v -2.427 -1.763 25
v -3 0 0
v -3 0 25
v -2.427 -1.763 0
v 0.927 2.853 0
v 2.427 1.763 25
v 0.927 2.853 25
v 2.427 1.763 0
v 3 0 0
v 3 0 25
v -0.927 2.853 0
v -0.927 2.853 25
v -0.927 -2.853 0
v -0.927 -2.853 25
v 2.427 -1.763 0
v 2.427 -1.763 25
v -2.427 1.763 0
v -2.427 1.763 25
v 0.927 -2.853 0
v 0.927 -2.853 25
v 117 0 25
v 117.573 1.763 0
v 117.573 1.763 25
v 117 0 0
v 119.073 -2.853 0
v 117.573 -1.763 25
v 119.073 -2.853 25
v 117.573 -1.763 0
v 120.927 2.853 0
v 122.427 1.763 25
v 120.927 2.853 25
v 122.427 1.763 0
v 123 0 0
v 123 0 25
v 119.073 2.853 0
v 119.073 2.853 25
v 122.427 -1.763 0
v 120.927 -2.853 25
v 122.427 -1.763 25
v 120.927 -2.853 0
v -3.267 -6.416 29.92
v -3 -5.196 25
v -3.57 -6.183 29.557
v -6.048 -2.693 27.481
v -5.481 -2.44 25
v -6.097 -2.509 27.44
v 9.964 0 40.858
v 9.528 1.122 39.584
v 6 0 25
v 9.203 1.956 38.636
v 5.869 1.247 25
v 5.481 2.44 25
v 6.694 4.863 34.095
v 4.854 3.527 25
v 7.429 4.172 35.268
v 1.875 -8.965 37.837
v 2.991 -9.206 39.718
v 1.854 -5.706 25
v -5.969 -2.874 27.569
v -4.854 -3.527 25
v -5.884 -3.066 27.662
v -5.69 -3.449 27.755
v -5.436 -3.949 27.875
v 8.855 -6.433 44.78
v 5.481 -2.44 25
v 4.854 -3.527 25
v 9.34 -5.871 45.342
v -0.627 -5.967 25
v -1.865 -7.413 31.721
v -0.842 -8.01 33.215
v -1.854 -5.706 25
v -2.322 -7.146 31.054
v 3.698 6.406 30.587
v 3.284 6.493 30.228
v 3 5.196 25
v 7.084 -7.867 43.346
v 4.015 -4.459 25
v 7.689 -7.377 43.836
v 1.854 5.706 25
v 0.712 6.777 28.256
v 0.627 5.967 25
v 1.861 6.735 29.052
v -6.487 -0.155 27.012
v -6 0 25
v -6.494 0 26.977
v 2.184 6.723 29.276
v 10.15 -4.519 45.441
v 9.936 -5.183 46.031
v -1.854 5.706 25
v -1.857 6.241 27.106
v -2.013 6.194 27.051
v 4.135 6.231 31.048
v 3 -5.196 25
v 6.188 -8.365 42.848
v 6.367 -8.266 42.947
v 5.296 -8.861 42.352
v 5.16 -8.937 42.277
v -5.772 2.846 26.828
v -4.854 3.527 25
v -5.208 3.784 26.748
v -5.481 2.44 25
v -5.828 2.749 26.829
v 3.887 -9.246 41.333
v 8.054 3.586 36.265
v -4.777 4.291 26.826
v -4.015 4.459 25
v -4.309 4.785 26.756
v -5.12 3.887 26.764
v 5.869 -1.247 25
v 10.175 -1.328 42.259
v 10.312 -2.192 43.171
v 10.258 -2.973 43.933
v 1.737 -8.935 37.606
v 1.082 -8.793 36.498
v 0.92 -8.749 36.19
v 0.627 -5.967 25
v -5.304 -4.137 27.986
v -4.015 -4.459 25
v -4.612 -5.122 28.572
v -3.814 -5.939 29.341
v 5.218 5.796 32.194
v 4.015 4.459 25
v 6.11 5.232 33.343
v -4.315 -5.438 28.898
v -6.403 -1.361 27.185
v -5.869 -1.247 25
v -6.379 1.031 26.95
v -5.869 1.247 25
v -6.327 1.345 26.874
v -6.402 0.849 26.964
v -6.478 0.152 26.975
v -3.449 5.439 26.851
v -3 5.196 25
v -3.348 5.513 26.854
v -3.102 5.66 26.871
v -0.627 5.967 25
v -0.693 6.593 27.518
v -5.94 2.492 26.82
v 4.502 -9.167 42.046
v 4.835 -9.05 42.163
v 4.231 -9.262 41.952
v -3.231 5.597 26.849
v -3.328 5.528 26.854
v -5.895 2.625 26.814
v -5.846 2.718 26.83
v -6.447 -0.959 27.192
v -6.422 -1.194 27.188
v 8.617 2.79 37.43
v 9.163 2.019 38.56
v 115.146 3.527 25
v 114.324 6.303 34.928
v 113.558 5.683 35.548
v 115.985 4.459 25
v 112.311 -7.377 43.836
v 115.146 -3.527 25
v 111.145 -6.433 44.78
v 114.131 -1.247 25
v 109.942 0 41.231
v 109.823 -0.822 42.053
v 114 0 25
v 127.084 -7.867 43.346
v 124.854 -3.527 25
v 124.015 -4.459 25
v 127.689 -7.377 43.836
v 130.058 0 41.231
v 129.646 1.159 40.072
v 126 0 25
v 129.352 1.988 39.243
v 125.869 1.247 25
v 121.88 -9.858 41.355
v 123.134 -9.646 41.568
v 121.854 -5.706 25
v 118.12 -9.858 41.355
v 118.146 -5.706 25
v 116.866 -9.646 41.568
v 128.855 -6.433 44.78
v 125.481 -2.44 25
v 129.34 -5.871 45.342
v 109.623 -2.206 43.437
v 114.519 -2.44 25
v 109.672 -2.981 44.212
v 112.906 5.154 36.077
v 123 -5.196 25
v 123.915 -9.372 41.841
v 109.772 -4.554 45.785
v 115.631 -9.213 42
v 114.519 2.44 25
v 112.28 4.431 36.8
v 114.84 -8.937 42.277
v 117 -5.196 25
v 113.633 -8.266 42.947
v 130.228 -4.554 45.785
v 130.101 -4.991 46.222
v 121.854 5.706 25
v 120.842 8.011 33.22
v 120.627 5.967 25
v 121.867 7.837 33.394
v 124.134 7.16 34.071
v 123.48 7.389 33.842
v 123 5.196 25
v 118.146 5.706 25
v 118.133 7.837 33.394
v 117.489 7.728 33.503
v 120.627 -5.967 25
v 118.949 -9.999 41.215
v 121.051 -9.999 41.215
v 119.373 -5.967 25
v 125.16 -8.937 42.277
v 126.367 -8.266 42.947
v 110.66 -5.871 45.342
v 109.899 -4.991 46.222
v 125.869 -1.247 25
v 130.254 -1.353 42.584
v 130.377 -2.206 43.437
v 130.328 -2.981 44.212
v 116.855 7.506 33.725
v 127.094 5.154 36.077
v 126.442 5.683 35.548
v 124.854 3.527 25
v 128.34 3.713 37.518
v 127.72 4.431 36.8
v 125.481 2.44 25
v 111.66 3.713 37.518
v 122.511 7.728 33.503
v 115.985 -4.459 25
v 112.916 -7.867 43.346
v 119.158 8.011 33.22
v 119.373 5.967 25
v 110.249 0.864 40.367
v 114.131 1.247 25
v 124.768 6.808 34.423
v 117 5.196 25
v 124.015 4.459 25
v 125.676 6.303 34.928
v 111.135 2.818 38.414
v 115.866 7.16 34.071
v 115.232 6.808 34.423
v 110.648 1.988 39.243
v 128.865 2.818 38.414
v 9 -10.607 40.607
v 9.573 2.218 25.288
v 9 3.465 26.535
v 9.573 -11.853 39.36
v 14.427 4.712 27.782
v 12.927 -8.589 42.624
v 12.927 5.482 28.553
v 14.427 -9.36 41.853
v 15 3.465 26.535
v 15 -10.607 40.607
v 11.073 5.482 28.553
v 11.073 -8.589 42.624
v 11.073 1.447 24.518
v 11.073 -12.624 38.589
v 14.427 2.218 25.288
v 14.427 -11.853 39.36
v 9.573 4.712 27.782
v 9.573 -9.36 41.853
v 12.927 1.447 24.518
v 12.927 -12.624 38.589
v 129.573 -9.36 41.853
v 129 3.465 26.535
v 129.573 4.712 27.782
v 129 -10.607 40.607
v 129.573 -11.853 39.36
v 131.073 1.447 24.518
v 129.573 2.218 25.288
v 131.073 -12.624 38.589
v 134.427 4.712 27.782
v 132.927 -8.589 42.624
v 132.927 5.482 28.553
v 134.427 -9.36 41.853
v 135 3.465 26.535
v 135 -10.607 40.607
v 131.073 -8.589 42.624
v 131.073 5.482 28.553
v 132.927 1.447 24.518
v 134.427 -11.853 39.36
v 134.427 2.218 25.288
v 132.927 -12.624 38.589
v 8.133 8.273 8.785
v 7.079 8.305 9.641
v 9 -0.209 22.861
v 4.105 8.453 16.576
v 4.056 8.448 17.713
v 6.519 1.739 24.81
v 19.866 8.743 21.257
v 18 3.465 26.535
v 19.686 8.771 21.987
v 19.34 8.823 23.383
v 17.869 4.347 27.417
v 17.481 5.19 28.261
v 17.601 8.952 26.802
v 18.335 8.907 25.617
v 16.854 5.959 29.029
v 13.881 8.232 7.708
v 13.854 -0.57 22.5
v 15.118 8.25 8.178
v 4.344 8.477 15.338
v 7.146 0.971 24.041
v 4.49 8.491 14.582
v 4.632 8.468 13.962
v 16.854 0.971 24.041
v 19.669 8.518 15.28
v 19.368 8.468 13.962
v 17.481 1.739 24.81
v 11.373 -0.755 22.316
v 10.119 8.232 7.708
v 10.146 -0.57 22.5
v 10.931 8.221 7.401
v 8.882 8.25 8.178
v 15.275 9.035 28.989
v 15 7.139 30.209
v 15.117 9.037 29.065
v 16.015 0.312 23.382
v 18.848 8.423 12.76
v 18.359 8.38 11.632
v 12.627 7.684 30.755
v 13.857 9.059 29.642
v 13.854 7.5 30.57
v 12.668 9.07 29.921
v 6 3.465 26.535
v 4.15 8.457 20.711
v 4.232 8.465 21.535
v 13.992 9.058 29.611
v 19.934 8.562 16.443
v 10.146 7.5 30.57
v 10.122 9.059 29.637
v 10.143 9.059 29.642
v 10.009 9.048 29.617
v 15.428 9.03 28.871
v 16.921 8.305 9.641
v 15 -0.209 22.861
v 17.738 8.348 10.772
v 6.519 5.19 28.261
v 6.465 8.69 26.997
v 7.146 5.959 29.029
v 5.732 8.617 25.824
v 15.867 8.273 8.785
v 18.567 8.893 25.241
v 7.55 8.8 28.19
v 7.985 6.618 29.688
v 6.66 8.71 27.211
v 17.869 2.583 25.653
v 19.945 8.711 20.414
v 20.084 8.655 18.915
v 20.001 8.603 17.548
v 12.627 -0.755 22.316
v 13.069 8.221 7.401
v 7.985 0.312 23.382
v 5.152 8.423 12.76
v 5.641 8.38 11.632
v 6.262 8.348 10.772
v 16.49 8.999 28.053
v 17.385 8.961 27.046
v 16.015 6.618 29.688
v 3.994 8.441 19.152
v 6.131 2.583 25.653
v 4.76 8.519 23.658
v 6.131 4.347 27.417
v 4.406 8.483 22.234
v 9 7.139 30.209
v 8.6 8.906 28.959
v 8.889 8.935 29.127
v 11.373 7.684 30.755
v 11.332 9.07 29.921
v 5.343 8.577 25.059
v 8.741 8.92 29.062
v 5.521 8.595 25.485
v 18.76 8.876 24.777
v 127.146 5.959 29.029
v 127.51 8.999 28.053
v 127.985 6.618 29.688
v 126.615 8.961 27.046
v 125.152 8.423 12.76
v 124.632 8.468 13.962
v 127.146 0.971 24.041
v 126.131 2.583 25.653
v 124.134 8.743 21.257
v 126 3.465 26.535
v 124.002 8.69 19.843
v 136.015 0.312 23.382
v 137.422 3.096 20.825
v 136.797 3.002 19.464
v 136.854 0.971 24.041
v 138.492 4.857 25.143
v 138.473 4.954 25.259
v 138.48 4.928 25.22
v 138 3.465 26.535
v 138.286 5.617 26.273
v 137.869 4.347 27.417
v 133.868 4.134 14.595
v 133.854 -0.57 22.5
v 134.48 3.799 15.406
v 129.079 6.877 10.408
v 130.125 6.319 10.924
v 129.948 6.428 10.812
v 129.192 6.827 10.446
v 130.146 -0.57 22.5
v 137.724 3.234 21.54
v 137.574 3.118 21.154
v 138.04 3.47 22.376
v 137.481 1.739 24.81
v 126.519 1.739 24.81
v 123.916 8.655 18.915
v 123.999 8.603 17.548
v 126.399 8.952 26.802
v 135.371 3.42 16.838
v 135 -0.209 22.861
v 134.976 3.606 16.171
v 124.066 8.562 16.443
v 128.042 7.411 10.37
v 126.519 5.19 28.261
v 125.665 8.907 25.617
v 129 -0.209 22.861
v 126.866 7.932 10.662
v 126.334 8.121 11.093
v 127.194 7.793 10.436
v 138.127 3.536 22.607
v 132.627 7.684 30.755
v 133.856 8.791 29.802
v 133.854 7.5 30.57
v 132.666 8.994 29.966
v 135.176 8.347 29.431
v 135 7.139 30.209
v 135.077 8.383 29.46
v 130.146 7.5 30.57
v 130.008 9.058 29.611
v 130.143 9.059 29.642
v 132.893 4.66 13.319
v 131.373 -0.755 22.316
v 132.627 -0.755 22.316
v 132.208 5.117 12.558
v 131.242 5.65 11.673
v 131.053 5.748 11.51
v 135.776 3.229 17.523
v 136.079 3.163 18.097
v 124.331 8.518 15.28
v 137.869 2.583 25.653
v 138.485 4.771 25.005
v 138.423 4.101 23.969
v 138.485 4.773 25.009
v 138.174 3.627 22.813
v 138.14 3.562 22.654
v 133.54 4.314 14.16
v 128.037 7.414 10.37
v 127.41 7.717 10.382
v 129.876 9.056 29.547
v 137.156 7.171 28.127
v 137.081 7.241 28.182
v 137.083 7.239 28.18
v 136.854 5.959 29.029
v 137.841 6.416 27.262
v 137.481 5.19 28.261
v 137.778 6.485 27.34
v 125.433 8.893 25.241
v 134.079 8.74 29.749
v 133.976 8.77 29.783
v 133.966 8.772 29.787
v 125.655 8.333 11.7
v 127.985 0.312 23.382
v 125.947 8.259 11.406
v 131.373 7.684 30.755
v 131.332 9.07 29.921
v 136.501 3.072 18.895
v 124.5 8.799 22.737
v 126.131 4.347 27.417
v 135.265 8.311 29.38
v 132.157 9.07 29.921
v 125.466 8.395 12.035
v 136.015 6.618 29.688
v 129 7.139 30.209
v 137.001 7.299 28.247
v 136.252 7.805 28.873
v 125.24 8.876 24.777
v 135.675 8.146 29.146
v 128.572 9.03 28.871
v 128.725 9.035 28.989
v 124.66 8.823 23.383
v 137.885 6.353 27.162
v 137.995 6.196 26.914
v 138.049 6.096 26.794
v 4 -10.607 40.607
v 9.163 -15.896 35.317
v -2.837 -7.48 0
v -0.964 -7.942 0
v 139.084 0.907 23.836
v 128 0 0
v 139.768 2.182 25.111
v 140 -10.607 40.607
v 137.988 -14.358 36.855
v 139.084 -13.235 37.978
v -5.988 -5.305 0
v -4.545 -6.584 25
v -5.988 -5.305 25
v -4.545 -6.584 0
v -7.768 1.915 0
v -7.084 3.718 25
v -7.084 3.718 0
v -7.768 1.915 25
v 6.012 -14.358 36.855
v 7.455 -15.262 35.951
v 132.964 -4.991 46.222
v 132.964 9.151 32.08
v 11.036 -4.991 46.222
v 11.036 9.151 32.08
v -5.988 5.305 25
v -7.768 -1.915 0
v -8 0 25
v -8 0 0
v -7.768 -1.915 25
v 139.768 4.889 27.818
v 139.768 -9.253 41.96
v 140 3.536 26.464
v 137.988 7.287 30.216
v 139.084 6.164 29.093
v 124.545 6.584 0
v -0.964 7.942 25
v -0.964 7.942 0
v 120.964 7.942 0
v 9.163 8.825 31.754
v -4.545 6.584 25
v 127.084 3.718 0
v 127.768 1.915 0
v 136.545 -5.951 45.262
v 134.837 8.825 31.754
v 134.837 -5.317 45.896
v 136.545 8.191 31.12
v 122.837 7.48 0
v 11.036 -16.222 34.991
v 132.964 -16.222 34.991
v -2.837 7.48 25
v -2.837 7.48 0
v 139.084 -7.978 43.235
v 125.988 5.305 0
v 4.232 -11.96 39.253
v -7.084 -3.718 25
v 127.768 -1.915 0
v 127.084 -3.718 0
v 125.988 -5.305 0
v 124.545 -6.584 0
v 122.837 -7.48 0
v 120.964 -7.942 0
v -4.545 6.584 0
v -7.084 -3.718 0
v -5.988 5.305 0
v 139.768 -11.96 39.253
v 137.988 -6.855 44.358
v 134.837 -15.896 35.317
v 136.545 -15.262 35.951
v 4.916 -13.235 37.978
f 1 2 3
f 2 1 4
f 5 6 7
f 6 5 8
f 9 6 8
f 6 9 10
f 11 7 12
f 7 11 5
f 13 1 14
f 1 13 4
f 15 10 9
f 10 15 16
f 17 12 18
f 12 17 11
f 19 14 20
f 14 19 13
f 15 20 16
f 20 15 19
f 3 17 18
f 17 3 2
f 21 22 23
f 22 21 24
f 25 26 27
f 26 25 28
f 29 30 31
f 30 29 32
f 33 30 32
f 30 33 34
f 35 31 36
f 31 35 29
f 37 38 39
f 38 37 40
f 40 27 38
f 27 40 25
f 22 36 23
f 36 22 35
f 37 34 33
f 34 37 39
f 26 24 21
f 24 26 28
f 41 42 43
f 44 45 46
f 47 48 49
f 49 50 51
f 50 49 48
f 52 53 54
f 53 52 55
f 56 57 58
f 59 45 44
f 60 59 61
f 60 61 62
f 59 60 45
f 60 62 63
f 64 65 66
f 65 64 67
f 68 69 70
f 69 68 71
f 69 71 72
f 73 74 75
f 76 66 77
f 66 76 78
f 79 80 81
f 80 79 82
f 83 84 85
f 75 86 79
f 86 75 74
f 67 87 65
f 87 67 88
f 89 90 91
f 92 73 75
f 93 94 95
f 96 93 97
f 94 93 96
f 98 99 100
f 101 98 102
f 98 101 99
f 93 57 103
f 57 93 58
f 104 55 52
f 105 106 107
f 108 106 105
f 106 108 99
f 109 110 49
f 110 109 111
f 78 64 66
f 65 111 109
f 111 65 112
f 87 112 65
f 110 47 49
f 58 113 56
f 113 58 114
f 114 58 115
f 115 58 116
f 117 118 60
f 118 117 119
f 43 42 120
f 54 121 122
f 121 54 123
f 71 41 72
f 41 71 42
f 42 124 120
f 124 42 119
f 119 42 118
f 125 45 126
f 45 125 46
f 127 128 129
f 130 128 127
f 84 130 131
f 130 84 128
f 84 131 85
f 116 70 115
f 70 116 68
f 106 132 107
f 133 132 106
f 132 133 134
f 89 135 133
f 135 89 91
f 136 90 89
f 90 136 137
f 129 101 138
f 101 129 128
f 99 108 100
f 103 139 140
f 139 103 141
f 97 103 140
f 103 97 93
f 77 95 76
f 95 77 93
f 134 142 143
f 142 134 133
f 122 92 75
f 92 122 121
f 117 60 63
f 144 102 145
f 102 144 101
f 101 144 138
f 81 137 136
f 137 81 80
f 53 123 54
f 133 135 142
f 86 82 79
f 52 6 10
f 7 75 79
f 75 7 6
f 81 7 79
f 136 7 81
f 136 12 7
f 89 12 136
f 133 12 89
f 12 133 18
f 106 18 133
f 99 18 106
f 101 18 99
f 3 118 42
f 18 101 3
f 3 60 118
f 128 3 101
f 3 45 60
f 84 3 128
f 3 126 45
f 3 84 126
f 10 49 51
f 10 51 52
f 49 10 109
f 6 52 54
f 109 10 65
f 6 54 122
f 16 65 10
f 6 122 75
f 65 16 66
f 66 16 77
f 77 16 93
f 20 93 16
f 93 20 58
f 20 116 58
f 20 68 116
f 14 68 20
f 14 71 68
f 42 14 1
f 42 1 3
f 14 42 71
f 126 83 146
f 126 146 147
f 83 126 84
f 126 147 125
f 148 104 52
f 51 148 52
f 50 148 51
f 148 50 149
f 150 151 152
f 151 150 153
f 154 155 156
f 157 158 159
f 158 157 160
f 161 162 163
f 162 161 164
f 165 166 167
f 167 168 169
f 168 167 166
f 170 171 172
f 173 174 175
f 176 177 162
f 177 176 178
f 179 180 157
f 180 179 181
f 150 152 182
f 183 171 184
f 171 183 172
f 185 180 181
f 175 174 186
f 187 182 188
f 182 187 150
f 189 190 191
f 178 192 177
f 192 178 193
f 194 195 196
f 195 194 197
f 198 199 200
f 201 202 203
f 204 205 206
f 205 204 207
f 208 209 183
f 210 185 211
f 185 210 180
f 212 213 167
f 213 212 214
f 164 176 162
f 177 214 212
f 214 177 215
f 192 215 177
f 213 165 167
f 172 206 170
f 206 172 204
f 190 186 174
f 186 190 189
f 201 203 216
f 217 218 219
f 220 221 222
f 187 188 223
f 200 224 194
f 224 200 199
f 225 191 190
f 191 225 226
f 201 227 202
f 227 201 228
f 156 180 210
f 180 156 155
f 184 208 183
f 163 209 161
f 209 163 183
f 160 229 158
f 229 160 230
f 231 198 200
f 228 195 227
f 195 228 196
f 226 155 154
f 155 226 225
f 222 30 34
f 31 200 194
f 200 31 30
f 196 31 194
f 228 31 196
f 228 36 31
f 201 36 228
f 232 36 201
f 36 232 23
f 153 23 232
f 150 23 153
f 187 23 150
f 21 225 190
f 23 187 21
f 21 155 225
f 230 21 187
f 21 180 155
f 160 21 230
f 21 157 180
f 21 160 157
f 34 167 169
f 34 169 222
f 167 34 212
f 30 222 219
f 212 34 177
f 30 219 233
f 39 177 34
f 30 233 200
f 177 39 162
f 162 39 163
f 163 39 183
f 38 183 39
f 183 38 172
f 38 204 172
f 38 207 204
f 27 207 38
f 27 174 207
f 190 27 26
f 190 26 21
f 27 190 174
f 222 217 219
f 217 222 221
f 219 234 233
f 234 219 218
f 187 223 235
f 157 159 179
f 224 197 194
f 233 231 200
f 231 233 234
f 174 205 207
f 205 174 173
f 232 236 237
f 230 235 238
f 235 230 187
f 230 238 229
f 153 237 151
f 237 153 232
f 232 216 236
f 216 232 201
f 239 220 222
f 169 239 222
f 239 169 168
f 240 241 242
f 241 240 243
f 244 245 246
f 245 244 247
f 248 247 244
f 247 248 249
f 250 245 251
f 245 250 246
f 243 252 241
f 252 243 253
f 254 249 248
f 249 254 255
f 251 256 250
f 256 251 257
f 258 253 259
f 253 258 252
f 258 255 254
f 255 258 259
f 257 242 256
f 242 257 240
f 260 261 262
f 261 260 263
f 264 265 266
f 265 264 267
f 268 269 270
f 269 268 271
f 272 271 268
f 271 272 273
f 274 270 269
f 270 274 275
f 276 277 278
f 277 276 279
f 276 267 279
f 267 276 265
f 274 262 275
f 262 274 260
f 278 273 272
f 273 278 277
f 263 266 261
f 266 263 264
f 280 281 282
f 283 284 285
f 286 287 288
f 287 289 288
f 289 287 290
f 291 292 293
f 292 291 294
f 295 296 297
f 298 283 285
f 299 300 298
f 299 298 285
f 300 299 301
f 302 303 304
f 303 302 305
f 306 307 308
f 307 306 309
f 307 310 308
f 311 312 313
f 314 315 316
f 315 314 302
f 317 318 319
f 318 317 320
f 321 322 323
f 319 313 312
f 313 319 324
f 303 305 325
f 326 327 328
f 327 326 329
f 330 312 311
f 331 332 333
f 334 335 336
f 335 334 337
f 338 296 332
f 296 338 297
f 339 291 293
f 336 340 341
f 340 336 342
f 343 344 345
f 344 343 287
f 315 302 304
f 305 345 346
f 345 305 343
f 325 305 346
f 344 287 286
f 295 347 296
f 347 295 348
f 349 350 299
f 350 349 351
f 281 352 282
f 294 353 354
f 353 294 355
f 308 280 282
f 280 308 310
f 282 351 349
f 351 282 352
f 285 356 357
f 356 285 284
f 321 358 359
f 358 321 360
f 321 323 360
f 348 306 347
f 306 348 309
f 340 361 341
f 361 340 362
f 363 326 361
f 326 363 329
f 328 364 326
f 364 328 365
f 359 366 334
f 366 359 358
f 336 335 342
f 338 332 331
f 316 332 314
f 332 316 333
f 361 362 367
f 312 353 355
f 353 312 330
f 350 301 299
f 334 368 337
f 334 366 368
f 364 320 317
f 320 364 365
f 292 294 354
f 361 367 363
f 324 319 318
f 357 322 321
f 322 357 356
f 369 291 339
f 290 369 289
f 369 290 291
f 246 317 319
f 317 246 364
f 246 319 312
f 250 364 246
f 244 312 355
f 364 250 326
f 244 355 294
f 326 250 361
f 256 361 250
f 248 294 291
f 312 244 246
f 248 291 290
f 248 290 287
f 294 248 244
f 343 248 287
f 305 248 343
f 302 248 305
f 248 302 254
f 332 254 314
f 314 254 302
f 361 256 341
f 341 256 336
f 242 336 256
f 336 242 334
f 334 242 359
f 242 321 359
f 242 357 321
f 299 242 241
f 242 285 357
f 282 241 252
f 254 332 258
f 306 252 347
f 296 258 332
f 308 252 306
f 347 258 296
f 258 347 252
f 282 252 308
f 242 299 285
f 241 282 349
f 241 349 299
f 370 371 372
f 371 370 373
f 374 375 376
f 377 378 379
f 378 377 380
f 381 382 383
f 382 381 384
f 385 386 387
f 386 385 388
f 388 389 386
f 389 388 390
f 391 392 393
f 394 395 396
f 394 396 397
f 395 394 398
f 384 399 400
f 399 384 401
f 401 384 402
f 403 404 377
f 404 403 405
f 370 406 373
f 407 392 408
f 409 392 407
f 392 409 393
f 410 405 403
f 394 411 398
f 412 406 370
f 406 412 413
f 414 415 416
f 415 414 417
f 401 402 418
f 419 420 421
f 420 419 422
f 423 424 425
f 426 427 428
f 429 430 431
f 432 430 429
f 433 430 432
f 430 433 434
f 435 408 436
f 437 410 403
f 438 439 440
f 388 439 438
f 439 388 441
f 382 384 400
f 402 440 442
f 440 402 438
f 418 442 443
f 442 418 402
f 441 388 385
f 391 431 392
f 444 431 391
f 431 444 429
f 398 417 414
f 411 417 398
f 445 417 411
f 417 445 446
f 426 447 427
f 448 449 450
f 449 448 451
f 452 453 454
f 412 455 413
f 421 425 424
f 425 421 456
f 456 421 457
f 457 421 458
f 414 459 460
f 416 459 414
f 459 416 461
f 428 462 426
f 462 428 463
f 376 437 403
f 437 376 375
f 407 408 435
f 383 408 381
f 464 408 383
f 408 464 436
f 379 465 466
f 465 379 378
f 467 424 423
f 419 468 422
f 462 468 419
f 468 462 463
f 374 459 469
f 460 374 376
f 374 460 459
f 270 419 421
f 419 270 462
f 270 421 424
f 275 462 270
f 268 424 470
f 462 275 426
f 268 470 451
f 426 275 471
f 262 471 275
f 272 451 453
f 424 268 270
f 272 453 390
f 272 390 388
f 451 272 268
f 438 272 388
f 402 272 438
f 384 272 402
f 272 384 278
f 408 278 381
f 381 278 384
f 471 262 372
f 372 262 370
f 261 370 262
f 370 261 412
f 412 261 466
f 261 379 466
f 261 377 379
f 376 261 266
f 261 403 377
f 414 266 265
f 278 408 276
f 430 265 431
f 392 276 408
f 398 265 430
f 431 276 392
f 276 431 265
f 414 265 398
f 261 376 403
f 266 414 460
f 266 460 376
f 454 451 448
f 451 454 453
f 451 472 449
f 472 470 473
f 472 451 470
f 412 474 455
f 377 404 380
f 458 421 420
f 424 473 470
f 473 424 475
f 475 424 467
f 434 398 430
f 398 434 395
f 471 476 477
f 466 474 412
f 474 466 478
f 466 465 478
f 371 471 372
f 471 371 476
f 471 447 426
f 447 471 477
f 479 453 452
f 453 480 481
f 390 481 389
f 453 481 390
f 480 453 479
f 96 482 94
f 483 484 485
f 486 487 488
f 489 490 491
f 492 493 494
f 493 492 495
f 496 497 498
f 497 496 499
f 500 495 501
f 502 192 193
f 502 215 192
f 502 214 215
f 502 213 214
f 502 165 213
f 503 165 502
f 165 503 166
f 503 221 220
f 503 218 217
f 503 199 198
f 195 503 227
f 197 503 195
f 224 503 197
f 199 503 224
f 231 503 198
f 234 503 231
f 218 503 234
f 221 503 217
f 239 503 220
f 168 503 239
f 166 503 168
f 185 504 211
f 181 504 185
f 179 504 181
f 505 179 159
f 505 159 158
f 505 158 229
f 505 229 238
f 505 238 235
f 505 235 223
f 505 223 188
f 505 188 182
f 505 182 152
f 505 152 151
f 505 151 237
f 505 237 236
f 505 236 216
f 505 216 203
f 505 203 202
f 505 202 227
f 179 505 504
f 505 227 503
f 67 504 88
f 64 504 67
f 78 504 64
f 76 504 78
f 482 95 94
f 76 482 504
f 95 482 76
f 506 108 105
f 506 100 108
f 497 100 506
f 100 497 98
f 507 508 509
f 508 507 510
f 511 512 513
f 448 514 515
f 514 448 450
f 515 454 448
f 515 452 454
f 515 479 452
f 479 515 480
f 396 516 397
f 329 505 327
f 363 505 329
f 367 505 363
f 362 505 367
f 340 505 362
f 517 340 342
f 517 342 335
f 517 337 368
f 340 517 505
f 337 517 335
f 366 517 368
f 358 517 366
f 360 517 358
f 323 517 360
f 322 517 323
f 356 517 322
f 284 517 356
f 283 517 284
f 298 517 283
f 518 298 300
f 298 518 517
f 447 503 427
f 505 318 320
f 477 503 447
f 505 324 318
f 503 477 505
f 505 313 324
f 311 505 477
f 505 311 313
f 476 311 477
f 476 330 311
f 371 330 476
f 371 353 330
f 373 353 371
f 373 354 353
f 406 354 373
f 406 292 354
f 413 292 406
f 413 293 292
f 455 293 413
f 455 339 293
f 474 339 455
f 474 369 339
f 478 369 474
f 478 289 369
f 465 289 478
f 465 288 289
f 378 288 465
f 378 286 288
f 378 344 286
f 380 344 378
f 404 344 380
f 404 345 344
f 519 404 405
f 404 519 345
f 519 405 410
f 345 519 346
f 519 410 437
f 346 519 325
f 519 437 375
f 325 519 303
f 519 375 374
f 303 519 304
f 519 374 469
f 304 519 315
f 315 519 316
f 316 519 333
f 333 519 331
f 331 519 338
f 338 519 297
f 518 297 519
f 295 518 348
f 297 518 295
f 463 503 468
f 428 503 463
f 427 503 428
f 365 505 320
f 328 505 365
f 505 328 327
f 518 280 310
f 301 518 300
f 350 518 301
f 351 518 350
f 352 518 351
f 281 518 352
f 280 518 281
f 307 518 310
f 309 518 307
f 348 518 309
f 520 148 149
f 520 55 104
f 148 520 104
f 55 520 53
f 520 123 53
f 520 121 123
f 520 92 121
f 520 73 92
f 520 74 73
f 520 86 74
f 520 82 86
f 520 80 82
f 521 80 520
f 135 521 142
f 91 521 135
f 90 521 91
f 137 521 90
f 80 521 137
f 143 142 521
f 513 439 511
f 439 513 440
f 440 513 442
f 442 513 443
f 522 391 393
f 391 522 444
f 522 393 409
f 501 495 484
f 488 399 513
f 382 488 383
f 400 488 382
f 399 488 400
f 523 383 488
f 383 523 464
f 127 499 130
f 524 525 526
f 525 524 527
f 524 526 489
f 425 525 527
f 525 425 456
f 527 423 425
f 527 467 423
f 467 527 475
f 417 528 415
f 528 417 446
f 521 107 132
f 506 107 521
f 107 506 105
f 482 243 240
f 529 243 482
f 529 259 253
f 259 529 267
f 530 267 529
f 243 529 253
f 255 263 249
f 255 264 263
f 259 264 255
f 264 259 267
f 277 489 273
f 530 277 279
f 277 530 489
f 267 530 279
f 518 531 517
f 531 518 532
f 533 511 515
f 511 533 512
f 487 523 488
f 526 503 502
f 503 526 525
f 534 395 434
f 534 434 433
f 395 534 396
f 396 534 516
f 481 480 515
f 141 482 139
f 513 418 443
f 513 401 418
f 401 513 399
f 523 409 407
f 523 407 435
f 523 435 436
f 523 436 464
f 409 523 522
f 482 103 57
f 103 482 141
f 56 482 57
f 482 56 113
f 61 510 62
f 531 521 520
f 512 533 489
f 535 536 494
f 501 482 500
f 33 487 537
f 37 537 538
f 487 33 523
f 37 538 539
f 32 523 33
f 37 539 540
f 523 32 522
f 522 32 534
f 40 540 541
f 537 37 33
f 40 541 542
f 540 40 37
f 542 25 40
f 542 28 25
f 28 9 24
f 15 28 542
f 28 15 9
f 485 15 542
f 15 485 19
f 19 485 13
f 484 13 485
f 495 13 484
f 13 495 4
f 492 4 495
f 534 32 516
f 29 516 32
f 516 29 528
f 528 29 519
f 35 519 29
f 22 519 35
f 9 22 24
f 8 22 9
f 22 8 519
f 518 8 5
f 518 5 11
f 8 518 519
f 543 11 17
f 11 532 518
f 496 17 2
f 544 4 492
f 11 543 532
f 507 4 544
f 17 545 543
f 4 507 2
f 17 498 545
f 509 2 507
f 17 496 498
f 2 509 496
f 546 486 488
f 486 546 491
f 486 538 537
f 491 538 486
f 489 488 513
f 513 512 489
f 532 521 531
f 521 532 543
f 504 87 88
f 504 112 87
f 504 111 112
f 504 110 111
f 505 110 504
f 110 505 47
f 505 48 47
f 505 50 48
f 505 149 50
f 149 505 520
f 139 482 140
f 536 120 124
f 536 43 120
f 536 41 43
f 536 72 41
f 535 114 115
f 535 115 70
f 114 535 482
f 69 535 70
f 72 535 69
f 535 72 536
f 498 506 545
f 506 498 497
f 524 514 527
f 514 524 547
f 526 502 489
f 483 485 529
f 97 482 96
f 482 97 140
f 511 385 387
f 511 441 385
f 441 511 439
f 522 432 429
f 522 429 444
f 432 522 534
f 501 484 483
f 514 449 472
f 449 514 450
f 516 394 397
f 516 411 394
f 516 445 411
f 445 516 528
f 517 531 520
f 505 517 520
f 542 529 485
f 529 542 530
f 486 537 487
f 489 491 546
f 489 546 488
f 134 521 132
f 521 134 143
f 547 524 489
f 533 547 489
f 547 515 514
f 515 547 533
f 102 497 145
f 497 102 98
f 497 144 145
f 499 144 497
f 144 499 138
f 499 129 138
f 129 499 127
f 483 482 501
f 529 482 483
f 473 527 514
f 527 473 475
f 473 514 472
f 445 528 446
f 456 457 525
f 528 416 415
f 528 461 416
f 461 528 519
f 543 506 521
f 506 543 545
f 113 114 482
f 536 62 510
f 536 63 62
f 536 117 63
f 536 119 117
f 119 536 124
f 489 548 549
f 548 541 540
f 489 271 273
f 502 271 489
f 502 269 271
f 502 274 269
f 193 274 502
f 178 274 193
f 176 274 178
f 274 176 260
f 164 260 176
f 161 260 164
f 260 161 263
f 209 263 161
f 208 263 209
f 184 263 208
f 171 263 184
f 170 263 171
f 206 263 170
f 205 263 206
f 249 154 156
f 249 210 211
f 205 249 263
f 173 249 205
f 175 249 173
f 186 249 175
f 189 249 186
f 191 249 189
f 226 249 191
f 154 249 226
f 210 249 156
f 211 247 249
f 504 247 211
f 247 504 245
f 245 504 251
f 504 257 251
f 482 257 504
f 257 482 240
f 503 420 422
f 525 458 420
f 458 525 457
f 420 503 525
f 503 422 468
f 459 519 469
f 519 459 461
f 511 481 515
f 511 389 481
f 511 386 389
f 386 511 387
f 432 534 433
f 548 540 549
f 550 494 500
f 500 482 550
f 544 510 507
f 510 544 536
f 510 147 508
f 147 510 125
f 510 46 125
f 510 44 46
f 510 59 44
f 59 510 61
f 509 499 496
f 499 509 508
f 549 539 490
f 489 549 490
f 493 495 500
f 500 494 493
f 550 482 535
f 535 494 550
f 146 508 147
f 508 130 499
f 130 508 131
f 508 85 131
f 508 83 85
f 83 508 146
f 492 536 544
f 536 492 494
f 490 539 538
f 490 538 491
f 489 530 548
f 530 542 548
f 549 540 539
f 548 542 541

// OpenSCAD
bolt_gap=120;
bolt=6;

seat_bolt=25;
bottle_bolt=20;
collision_offset=bolt*2;

seat_to_pivot=30;
bottle_to_pivot=15;
angle=45;

wall=5;

od=bolt+wall*2;
pad=0.1;

bolt_head=12;
bolt_head_height=50;
bolt_head_d2=bolt_head+bolt_head_height/2;


module place_bolts() {
	children();
	translate([bolt_gap,0])
	children();
}

module positive() {
	hull()
	positive_unhulled();
}

module positive_unhulled() {
	hull()
	place_bolts()
	cylinder(d=od,h=seat_bolt);

	
	color("lime")
	place_bottle()
	hull()
	place_bolts()
	cylinder(d=od,h=bottle_bolt);
}

module place_bottle() {
	translate([collision_offset,0,seat_to_pivot])
	rotate([angle,0])
	translate([0,0,bottle_to_pivot-bottle_bolt])
	children();
}

bolt_extra=100;

module bolts(height,head_height,extra=0) {
	place_bolts()
	translate([0,0,-pad])
	cylinder(d=bolt,h=seat_bolt+pad*2+extra);

	place_bolts()
	translate([0,0,head_height])
	cylinder(d1=bolt_head,d2=bolt_head_d2,h=bolt_head_height);
}

difference() {
	positive();

	bolts(seat_bolt,seat_bolt,bolt_extra);

	place_bottle()
	translate([0,0,bottle_bolt+pad])
	mirror([0,0,1])
	bolts(bottle_bolt,bottle_bolt,bolt_extra);
}
